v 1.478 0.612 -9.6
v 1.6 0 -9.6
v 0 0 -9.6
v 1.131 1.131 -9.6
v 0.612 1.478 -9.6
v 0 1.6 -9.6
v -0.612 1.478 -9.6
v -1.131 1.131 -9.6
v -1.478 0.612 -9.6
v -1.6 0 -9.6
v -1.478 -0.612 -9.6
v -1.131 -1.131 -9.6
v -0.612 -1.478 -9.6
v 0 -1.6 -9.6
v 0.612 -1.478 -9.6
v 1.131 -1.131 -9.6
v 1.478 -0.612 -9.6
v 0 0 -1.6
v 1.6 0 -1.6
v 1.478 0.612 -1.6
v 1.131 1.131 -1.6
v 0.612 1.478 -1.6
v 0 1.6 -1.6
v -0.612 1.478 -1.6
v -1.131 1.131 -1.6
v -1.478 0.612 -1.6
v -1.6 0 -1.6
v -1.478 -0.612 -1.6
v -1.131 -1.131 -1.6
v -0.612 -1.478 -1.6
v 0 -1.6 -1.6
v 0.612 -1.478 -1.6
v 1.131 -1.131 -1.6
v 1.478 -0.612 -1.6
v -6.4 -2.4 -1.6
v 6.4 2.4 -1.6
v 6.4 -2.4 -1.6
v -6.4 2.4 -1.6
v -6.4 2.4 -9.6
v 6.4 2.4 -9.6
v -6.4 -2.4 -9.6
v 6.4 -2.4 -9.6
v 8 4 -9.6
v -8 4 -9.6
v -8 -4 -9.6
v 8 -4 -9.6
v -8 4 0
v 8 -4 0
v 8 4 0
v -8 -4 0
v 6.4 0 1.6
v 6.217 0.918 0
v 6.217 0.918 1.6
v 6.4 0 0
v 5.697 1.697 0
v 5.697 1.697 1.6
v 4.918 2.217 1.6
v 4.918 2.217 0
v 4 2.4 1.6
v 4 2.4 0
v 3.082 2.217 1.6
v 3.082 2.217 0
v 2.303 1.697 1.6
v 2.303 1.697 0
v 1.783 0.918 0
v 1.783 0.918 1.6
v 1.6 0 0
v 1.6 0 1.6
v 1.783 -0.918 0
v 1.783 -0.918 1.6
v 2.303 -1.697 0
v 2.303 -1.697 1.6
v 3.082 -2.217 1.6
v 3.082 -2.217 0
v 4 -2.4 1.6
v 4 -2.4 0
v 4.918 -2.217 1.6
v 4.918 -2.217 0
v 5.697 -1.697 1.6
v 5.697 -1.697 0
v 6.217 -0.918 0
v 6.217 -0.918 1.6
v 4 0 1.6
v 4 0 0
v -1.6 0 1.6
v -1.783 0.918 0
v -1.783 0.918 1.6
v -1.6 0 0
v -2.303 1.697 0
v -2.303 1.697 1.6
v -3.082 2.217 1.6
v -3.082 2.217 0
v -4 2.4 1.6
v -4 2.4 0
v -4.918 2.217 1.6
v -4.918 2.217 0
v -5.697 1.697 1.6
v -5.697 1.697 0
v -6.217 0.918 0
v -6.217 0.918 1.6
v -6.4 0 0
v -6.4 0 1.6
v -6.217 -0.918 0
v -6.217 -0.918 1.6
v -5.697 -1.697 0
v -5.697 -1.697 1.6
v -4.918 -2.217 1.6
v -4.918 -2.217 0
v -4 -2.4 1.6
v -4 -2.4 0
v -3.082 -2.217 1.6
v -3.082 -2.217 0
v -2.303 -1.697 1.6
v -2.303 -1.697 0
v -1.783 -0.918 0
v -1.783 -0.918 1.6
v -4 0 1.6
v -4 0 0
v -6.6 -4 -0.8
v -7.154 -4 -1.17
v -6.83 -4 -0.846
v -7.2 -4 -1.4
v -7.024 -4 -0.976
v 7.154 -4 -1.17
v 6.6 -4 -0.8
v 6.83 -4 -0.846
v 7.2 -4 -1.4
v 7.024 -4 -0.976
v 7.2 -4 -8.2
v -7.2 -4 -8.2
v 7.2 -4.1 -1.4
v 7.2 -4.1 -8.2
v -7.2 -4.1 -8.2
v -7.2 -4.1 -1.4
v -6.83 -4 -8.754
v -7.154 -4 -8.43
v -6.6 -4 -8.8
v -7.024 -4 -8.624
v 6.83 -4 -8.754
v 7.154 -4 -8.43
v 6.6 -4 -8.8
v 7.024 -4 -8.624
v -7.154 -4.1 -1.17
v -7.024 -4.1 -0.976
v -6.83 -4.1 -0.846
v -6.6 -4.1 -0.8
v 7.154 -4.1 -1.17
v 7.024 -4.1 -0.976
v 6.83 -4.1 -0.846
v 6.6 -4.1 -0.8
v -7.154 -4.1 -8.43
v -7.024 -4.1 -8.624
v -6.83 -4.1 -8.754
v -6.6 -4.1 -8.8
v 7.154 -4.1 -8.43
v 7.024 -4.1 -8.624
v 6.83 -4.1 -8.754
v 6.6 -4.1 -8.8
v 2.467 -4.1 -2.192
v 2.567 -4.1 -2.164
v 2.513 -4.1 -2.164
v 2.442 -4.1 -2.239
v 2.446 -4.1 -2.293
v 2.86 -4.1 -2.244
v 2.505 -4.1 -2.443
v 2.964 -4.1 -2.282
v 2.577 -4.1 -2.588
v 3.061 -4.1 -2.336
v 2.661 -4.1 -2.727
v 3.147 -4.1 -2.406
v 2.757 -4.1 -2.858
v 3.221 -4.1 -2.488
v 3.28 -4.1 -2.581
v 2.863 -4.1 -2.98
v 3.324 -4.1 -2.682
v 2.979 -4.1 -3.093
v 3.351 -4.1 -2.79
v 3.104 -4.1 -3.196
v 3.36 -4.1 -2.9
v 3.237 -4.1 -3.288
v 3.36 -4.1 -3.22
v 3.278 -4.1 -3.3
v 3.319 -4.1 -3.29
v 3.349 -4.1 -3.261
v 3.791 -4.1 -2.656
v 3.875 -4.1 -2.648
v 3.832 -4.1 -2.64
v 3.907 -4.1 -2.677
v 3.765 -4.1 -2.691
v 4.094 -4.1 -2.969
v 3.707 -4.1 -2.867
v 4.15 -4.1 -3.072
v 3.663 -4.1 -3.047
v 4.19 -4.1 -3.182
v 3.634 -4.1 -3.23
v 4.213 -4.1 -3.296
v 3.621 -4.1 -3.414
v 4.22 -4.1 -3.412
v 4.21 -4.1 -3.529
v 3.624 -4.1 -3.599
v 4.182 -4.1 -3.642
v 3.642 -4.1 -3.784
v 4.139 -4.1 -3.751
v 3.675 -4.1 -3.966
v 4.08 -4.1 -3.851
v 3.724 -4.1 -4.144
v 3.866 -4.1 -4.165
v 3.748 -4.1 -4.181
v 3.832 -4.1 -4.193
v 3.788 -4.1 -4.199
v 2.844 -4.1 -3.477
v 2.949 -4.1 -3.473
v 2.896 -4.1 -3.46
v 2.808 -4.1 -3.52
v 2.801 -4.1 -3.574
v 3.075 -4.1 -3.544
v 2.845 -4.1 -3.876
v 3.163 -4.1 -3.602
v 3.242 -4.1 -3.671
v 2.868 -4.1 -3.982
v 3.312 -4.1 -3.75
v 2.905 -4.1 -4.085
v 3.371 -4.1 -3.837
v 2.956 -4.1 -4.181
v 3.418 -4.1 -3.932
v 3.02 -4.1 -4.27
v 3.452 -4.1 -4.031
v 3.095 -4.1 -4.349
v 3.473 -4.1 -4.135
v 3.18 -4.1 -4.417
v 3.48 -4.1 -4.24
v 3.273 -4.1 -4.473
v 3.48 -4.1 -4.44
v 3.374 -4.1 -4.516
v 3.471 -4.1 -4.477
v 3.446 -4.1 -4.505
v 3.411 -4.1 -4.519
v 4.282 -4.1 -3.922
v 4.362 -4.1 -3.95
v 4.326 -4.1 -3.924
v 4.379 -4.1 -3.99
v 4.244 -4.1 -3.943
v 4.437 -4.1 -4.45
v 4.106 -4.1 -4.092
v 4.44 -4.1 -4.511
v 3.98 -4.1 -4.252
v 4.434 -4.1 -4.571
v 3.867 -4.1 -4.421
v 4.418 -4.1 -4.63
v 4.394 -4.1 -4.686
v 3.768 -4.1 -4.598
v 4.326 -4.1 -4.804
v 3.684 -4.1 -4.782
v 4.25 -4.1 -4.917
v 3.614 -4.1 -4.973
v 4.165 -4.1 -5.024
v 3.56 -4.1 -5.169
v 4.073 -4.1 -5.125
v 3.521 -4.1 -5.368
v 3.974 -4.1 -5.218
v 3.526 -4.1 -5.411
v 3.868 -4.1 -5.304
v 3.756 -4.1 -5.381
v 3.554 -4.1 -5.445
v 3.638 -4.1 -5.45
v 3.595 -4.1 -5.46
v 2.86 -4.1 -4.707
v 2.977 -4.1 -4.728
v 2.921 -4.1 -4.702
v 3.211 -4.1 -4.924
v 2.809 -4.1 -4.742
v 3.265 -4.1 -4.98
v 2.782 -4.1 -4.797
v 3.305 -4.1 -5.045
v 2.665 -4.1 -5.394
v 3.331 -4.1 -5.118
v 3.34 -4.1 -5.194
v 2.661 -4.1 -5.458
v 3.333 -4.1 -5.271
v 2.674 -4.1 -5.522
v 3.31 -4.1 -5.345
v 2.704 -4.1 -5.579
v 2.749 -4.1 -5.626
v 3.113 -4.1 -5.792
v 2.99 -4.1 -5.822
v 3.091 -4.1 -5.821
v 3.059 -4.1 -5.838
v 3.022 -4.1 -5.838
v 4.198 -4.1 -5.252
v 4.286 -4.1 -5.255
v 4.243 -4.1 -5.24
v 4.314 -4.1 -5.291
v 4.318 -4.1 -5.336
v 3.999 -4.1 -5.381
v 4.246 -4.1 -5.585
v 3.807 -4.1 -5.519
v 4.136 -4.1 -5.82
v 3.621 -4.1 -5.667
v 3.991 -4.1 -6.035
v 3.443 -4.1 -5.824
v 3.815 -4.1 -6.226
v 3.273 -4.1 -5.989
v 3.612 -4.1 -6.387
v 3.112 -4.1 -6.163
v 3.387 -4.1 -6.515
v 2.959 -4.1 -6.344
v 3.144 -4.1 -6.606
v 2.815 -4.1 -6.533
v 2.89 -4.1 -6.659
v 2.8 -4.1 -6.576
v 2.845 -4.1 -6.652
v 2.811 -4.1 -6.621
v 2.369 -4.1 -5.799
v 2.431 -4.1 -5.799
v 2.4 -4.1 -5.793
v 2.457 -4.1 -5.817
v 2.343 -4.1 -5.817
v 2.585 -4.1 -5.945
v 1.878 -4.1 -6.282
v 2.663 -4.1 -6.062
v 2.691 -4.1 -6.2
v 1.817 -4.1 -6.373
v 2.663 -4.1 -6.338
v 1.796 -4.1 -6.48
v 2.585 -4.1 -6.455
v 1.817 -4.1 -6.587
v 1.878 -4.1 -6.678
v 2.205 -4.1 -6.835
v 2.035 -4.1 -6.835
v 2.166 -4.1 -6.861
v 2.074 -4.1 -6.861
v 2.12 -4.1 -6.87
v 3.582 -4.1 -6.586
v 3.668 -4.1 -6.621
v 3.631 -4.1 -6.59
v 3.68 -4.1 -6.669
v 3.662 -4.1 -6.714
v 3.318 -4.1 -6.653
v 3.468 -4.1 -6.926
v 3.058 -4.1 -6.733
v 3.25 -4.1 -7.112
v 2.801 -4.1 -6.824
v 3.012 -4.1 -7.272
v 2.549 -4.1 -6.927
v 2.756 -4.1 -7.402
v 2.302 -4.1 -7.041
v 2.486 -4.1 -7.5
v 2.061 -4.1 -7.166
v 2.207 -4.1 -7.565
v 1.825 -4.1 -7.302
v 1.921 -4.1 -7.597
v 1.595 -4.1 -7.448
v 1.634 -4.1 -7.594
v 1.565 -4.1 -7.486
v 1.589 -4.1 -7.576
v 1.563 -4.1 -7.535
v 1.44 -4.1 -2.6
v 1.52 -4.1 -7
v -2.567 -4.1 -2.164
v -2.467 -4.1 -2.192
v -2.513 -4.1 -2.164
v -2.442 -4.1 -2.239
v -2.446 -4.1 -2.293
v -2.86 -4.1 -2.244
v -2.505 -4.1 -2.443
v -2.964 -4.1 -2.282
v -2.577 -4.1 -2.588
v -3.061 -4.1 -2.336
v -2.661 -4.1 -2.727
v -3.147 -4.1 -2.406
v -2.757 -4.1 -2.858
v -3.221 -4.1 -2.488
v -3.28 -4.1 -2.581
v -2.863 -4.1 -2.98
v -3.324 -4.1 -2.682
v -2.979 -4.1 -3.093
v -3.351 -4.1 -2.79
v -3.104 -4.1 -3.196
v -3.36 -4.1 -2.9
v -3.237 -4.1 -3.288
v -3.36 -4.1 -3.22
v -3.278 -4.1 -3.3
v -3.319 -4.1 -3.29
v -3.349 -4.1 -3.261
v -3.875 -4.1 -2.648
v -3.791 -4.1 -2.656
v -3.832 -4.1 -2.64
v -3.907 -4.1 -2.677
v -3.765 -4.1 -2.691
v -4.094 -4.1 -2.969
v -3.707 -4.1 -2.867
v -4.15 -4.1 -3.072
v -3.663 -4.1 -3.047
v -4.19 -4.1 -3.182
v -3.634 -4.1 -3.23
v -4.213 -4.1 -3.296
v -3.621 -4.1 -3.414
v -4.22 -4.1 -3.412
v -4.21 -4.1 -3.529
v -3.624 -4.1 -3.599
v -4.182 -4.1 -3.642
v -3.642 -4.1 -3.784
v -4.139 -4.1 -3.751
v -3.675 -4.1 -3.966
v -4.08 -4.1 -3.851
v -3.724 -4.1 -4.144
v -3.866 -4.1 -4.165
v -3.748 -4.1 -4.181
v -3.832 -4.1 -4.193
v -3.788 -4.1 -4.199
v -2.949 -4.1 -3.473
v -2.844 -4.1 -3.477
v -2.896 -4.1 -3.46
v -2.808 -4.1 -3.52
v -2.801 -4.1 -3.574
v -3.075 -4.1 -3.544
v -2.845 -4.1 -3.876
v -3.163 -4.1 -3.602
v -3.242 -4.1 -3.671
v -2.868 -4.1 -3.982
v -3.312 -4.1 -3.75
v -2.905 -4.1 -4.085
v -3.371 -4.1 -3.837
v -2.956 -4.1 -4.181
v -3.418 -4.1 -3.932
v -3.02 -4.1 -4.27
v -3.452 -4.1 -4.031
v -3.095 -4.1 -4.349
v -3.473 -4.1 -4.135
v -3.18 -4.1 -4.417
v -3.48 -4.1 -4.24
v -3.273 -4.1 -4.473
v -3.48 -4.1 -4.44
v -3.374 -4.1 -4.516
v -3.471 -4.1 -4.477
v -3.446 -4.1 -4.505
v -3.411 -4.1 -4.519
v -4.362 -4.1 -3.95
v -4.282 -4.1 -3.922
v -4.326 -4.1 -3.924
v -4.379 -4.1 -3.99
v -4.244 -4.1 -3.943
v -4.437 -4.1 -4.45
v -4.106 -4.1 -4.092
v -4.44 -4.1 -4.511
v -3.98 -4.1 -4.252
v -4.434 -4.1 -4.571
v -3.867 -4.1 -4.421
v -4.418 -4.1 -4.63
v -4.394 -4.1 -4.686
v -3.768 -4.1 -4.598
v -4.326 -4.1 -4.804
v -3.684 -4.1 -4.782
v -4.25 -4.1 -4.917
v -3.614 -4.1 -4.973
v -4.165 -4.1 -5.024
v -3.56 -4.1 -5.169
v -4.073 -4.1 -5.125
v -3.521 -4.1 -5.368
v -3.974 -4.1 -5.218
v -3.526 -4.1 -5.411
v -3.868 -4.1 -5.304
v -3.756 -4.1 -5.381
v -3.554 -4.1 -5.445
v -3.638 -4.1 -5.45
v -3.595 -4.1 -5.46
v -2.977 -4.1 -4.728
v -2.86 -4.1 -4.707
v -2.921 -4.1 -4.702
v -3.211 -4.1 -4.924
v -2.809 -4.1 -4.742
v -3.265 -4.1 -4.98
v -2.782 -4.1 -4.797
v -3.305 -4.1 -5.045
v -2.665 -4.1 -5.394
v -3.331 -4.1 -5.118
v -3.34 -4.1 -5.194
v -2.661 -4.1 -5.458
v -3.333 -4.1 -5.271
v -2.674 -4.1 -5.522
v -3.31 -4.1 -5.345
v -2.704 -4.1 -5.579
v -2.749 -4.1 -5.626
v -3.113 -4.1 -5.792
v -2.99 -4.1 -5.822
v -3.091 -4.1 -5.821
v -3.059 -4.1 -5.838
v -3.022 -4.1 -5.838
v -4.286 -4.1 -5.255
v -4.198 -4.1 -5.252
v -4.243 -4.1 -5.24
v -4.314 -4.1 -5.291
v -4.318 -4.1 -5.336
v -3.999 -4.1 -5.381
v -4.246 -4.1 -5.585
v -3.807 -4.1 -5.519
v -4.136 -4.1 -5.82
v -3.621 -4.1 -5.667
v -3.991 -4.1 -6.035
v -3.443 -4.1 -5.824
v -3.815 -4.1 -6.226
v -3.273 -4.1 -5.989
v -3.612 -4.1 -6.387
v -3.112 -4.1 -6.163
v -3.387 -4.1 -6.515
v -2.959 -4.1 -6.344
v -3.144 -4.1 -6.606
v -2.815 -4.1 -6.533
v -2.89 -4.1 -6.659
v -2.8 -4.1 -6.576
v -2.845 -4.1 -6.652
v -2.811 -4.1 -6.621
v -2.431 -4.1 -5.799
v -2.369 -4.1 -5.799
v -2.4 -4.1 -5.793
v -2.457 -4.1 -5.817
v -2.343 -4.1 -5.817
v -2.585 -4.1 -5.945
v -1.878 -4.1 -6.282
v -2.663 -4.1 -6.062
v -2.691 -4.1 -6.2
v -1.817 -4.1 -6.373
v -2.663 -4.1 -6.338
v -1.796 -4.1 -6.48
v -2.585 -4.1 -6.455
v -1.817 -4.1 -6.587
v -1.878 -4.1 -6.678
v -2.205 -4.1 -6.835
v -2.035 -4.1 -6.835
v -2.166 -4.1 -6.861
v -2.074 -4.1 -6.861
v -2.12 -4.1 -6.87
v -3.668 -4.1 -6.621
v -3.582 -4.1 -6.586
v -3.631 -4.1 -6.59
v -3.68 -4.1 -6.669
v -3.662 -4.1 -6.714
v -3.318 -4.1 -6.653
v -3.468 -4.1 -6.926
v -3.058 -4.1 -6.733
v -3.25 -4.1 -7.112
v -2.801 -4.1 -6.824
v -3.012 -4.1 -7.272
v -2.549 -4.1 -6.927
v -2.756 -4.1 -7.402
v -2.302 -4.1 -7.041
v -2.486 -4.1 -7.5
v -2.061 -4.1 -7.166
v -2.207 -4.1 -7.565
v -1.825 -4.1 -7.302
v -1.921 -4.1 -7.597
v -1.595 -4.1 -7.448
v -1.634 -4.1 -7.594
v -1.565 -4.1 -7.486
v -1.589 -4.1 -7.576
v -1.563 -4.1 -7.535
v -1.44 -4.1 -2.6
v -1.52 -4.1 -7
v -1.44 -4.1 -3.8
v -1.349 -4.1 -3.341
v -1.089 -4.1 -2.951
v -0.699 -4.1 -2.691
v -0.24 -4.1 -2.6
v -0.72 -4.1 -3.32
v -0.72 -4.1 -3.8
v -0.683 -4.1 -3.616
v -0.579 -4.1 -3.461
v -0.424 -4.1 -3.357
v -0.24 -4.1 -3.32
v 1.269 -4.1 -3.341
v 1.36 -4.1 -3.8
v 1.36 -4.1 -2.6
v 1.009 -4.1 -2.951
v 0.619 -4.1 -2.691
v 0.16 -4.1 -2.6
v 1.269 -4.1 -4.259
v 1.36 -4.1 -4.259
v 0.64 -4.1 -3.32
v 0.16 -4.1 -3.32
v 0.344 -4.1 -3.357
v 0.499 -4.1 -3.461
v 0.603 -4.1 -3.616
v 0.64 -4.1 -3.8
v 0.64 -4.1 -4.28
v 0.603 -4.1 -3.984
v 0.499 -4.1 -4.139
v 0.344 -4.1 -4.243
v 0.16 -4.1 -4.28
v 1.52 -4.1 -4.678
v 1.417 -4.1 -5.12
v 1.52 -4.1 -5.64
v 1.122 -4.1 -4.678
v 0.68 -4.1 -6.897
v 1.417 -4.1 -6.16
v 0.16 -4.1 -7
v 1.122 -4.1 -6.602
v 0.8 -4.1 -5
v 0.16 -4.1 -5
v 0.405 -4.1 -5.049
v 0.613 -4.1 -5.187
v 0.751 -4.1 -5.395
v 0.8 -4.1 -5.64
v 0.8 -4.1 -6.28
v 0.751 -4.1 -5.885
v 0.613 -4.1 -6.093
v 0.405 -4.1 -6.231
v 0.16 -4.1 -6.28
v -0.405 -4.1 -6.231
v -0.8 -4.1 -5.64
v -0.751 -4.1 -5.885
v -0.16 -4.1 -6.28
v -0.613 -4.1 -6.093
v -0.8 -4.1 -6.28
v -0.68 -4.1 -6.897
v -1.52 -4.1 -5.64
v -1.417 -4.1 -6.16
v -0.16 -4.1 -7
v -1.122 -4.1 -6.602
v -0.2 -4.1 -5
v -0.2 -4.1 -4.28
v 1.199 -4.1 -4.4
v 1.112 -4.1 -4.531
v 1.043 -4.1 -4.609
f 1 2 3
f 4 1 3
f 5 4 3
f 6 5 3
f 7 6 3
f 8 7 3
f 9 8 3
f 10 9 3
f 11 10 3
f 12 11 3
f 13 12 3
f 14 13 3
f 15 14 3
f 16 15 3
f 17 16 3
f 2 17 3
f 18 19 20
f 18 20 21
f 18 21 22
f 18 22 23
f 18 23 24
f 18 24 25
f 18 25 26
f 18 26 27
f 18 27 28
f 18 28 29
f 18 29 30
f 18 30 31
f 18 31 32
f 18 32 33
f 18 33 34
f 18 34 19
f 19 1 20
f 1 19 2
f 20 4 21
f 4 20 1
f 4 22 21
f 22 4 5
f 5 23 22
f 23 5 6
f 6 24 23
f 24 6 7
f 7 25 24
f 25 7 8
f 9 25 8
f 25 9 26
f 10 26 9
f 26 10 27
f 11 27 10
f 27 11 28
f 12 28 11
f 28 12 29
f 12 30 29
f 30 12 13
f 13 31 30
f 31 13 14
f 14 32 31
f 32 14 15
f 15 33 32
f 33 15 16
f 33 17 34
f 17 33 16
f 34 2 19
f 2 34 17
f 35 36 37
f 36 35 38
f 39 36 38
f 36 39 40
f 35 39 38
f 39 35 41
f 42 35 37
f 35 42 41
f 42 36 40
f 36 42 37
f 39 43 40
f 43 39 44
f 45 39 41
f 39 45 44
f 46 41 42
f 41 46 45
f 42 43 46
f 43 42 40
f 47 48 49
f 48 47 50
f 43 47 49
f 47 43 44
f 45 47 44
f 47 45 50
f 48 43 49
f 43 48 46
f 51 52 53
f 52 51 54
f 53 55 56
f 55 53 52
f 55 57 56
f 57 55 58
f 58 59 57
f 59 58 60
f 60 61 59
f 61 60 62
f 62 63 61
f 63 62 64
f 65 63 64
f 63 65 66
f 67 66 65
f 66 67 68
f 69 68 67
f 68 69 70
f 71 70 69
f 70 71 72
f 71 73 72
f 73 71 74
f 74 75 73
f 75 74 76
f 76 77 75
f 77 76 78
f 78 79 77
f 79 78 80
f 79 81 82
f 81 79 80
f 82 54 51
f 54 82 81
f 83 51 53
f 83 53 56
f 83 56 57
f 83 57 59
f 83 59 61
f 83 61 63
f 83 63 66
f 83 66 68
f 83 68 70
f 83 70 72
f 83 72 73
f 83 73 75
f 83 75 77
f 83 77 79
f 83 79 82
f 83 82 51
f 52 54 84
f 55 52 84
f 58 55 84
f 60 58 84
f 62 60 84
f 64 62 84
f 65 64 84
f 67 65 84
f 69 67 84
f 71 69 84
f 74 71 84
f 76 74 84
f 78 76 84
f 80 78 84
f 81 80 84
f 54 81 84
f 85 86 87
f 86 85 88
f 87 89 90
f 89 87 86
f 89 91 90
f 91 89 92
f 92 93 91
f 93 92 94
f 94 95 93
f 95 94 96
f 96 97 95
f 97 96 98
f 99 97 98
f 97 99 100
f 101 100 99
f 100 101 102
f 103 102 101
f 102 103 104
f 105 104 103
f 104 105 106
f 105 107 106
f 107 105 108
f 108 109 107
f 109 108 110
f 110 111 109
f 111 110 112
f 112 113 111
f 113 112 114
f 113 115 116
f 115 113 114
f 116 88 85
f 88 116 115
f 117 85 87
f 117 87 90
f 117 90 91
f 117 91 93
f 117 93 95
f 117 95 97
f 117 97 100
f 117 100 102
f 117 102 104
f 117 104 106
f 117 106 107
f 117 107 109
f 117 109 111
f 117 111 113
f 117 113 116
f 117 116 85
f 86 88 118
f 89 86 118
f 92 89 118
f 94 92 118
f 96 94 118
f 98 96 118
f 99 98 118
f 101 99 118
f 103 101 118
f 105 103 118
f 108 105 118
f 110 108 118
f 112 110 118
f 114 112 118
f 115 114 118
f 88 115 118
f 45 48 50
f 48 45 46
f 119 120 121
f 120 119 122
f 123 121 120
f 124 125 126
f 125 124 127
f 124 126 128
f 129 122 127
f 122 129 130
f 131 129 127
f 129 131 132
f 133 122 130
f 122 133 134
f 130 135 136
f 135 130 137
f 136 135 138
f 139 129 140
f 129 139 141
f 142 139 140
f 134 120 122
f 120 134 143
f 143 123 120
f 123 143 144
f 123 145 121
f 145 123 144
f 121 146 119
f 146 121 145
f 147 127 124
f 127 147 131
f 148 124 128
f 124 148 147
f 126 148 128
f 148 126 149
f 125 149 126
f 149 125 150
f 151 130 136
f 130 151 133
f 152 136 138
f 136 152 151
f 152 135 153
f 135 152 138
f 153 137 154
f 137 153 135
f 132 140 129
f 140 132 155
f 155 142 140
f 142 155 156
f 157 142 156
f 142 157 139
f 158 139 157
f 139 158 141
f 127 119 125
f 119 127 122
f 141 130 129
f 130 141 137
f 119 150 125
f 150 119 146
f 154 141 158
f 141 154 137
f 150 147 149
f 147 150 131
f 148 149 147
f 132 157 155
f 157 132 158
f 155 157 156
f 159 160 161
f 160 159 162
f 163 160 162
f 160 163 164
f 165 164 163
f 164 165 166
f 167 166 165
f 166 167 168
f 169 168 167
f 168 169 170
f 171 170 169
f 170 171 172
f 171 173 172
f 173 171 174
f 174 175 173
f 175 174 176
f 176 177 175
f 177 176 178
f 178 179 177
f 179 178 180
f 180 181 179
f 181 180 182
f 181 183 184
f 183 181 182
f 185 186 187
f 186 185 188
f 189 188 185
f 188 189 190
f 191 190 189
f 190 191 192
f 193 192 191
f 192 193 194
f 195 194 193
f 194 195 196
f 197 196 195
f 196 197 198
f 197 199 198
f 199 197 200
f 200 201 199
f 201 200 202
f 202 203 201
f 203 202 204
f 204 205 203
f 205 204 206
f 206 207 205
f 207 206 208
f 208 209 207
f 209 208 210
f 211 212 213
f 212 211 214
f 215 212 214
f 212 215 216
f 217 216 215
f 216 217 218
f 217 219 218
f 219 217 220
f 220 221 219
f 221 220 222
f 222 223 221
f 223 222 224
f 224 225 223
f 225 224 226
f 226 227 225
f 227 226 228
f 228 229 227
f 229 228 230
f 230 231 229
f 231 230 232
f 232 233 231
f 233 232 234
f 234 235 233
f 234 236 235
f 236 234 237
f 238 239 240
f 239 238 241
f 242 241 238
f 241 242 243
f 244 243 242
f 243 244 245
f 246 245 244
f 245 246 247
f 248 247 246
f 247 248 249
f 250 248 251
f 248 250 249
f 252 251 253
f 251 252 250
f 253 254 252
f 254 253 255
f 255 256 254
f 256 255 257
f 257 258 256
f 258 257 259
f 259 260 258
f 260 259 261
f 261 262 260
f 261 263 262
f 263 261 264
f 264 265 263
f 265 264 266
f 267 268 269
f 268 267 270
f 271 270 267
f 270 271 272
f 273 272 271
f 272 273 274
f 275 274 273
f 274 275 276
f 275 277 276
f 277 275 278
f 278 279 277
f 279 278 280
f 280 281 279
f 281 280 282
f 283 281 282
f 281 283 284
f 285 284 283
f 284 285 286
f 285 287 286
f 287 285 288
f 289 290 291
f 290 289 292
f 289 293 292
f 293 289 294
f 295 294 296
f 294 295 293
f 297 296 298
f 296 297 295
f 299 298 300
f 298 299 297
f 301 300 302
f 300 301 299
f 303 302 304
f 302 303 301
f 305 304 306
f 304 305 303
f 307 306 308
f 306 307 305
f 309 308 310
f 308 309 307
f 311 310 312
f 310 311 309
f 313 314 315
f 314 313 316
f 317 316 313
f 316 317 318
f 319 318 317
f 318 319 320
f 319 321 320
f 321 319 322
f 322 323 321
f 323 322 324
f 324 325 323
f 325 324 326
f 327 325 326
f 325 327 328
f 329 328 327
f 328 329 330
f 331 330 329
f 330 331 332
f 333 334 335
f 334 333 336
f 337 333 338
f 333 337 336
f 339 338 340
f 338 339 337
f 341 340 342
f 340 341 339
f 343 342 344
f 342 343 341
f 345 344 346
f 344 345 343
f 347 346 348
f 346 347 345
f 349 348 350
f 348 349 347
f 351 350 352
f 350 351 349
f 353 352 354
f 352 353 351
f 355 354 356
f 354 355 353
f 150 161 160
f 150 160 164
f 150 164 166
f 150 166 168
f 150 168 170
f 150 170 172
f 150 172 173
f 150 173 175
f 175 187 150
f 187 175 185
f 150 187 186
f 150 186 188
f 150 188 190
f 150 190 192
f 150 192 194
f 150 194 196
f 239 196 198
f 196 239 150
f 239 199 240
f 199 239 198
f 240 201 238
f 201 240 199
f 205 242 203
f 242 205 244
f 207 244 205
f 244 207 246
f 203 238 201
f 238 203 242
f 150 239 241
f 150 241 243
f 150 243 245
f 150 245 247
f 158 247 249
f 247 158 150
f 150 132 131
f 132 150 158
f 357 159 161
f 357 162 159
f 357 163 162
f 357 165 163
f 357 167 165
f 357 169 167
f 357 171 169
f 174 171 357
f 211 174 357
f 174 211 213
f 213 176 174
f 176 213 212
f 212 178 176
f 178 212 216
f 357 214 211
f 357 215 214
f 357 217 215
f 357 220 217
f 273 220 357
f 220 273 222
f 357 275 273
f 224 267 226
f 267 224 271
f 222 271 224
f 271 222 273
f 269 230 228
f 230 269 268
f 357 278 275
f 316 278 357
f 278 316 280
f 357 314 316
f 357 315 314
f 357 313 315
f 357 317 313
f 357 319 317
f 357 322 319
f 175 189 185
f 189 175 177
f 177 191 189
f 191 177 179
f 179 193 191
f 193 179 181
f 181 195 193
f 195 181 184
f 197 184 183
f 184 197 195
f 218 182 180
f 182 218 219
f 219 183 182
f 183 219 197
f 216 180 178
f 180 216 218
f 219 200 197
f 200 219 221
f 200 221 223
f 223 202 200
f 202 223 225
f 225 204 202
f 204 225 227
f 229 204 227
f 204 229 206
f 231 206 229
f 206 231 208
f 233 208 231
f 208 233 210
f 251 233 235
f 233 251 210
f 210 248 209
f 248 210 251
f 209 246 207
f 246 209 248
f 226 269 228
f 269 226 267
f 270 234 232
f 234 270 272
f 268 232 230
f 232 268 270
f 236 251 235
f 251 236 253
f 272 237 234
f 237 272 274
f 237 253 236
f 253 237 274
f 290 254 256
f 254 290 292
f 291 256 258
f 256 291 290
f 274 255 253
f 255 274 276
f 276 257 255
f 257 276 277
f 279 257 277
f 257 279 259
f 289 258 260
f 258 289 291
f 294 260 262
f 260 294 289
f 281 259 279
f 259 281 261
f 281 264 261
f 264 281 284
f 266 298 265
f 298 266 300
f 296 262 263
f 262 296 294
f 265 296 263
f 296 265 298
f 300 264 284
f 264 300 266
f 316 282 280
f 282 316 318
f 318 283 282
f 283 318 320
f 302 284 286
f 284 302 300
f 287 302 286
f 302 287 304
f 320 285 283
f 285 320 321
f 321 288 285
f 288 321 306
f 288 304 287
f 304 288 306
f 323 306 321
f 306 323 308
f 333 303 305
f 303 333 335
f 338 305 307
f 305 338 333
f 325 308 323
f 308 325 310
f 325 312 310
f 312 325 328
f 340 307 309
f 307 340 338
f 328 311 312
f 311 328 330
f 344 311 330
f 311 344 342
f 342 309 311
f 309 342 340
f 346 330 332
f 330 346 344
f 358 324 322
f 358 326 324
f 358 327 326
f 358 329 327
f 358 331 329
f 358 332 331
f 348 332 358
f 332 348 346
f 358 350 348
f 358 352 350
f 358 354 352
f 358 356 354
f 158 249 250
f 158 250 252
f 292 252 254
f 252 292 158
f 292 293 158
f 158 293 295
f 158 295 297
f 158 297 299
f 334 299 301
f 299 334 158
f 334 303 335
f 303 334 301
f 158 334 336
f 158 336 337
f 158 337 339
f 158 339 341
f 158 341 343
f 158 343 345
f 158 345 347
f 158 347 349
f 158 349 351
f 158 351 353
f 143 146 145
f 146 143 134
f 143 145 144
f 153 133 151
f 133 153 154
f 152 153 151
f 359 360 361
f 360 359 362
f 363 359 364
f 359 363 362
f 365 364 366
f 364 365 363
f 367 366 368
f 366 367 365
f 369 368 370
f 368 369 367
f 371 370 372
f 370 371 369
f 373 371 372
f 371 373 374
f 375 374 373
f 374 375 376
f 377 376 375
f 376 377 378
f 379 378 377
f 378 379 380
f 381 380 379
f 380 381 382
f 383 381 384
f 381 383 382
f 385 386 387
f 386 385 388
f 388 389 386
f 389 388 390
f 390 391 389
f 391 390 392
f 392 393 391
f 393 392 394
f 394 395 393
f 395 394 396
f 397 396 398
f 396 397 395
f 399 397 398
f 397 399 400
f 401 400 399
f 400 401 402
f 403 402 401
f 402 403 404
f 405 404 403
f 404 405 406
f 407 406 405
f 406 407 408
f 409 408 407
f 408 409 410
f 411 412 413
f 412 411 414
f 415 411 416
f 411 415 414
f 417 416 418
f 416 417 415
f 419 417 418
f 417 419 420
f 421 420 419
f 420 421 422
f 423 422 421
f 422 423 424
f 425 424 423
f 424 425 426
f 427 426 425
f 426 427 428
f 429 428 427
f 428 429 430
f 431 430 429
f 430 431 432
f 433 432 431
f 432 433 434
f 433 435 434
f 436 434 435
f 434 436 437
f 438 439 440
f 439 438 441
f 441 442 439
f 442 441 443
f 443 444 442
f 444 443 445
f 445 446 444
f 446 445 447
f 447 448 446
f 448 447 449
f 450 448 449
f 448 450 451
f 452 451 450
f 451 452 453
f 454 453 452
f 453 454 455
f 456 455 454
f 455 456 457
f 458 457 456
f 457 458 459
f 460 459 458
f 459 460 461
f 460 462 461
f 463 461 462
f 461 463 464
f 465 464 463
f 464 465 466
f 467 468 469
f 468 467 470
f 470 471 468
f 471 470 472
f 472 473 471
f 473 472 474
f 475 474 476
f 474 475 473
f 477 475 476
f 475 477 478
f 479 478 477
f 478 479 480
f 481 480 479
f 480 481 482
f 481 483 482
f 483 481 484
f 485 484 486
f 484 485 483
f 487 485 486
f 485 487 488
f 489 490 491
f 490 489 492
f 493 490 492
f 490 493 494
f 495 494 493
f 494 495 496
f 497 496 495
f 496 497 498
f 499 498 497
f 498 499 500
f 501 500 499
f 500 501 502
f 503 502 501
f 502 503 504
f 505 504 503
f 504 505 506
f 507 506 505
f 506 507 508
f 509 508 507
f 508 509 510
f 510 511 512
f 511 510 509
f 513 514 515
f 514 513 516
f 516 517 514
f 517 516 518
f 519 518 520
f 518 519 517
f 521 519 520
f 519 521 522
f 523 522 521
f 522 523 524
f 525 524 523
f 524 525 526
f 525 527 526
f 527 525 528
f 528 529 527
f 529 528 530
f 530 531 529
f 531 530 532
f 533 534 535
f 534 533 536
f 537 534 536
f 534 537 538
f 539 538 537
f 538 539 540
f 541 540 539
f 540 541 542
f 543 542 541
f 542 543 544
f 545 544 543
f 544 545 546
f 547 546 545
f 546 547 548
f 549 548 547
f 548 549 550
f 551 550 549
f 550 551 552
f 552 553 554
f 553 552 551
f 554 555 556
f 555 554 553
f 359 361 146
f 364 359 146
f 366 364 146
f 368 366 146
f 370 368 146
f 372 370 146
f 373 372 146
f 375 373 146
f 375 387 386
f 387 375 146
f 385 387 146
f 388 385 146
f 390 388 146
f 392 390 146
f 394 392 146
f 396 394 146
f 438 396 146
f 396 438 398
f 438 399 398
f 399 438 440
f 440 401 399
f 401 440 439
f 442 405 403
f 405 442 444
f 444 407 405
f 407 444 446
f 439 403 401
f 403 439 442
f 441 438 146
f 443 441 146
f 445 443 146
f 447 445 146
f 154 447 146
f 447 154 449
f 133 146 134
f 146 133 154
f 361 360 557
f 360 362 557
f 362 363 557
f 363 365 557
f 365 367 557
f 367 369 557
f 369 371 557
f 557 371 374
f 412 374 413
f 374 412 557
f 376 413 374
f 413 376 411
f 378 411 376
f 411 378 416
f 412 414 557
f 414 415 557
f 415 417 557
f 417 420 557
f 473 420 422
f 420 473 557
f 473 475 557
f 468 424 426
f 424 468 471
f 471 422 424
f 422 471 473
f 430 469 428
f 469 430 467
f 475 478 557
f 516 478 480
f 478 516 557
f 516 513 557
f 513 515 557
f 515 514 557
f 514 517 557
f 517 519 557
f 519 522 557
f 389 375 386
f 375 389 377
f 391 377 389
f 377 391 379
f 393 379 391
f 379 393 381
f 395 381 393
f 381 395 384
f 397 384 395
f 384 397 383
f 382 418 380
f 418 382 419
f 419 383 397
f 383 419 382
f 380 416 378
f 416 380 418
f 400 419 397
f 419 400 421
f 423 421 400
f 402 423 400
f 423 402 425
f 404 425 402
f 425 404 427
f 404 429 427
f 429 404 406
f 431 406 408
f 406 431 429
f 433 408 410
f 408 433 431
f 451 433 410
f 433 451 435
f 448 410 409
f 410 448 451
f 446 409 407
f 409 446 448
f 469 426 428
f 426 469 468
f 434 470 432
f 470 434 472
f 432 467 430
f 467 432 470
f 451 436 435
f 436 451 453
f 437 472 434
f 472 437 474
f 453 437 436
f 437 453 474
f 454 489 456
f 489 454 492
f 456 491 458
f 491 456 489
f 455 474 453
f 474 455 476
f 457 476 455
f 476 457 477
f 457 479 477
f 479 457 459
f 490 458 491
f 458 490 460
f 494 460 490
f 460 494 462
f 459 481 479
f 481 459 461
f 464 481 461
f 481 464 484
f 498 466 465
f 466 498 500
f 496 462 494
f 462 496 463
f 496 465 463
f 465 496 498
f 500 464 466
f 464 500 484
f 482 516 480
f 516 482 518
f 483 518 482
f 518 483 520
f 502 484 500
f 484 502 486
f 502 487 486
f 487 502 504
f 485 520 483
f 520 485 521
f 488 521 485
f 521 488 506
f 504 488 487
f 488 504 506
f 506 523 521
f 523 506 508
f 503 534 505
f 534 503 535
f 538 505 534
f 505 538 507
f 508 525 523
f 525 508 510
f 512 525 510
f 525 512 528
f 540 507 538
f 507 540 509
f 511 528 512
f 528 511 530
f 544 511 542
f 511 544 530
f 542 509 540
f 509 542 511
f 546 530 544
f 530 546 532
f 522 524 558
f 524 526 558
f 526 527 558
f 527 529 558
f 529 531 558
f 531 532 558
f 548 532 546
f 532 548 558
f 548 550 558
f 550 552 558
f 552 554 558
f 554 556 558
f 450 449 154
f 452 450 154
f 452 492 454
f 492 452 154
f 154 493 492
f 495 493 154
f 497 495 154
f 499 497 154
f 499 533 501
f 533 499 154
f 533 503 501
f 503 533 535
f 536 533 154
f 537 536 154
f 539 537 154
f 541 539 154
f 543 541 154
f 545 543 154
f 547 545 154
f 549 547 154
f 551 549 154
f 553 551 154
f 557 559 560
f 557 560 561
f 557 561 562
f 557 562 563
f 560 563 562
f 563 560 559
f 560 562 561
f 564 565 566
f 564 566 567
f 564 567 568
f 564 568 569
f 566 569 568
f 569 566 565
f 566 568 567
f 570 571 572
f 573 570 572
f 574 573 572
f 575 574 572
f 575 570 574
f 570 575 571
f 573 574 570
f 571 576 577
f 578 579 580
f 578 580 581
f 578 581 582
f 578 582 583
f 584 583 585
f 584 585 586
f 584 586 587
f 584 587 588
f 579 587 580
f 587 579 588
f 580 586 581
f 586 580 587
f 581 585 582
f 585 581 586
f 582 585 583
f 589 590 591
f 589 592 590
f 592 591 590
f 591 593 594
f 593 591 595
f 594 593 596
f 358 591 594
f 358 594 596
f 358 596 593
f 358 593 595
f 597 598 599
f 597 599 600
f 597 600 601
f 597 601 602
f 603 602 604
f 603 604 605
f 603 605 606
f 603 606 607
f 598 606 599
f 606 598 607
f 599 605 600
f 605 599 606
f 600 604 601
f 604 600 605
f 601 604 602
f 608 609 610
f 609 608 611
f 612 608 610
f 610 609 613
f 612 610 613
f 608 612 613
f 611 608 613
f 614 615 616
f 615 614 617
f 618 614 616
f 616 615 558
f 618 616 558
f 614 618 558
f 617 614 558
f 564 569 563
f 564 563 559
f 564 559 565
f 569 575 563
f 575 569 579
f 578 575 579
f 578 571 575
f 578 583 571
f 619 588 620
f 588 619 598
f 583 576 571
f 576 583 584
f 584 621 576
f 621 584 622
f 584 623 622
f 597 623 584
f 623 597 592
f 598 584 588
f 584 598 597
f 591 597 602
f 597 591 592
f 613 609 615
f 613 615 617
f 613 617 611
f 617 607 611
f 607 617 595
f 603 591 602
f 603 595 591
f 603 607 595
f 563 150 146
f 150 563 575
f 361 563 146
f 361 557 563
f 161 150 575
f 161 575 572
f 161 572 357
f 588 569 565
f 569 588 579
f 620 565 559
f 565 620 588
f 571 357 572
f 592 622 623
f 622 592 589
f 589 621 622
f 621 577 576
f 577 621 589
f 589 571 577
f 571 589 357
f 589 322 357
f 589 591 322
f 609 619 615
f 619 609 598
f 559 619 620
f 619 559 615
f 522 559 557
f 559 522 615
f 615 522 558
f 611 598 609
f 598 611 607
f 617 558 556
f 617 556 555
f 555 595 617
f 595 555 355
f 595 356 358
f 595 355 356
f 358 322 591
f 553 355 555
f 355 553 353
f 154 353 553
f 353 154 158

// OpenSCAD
use <../lib.scad>
use <3004.scad>
use <6177969ag.scad>
function ldraw_lib__3004d1i() = [
// 0 Brick  1 x  2 with Red "3" and Black Laurel Wreath Sticker
// 0 Name: 3004d1i.dat
// 0 Author: Alfred Schmitz [AlfredS]
// 0 !LDRAW_ORG Shortcut UPDATE 2026-09
// 0 !LICENSE Licensed under CC BY 4.0 : see CAreadme.txt
// 
// 0 BFC CERTIFY CCW
  [0,"BFC","CERTIFY"],
  [0,"BFC","CCW"],
// 
// 0 !CATEGORY Sticker Shortcut
// 0 !KEYWORDS Ford, GT40, Set 75881, Speed Champions
// 
// 0 !HISTORY 2026-09-30 [OrionP] Official Update 2026-09
// 
// 1 16 0 0 0 1 0 0 0 1 0 0 0 1 3004.dat
  [1,16,0,0,0,1,0,0,0,1,0,0,0,1, ldraw_lib__3004()],
// 1 16 0 12 -10 1 0 0 0 0 -1 0 1 0 6177969ag.dat
  [1,16,0,12,-10,1,0,0,0,0,-1,0,1,0, ldraw_lib__6177969ag()],
];
module ldraw_lib__3004d1i(step=0, col=false, unit=2/5, alt=false, line=0.2, solid=!$preview)
    makepoly(ldraw_lib__3004d1i(), step=step, col=col, unit=unit, alt=alt, line=line, solid=solid);
ldraw_lib__3004d1i(line=0.2);
